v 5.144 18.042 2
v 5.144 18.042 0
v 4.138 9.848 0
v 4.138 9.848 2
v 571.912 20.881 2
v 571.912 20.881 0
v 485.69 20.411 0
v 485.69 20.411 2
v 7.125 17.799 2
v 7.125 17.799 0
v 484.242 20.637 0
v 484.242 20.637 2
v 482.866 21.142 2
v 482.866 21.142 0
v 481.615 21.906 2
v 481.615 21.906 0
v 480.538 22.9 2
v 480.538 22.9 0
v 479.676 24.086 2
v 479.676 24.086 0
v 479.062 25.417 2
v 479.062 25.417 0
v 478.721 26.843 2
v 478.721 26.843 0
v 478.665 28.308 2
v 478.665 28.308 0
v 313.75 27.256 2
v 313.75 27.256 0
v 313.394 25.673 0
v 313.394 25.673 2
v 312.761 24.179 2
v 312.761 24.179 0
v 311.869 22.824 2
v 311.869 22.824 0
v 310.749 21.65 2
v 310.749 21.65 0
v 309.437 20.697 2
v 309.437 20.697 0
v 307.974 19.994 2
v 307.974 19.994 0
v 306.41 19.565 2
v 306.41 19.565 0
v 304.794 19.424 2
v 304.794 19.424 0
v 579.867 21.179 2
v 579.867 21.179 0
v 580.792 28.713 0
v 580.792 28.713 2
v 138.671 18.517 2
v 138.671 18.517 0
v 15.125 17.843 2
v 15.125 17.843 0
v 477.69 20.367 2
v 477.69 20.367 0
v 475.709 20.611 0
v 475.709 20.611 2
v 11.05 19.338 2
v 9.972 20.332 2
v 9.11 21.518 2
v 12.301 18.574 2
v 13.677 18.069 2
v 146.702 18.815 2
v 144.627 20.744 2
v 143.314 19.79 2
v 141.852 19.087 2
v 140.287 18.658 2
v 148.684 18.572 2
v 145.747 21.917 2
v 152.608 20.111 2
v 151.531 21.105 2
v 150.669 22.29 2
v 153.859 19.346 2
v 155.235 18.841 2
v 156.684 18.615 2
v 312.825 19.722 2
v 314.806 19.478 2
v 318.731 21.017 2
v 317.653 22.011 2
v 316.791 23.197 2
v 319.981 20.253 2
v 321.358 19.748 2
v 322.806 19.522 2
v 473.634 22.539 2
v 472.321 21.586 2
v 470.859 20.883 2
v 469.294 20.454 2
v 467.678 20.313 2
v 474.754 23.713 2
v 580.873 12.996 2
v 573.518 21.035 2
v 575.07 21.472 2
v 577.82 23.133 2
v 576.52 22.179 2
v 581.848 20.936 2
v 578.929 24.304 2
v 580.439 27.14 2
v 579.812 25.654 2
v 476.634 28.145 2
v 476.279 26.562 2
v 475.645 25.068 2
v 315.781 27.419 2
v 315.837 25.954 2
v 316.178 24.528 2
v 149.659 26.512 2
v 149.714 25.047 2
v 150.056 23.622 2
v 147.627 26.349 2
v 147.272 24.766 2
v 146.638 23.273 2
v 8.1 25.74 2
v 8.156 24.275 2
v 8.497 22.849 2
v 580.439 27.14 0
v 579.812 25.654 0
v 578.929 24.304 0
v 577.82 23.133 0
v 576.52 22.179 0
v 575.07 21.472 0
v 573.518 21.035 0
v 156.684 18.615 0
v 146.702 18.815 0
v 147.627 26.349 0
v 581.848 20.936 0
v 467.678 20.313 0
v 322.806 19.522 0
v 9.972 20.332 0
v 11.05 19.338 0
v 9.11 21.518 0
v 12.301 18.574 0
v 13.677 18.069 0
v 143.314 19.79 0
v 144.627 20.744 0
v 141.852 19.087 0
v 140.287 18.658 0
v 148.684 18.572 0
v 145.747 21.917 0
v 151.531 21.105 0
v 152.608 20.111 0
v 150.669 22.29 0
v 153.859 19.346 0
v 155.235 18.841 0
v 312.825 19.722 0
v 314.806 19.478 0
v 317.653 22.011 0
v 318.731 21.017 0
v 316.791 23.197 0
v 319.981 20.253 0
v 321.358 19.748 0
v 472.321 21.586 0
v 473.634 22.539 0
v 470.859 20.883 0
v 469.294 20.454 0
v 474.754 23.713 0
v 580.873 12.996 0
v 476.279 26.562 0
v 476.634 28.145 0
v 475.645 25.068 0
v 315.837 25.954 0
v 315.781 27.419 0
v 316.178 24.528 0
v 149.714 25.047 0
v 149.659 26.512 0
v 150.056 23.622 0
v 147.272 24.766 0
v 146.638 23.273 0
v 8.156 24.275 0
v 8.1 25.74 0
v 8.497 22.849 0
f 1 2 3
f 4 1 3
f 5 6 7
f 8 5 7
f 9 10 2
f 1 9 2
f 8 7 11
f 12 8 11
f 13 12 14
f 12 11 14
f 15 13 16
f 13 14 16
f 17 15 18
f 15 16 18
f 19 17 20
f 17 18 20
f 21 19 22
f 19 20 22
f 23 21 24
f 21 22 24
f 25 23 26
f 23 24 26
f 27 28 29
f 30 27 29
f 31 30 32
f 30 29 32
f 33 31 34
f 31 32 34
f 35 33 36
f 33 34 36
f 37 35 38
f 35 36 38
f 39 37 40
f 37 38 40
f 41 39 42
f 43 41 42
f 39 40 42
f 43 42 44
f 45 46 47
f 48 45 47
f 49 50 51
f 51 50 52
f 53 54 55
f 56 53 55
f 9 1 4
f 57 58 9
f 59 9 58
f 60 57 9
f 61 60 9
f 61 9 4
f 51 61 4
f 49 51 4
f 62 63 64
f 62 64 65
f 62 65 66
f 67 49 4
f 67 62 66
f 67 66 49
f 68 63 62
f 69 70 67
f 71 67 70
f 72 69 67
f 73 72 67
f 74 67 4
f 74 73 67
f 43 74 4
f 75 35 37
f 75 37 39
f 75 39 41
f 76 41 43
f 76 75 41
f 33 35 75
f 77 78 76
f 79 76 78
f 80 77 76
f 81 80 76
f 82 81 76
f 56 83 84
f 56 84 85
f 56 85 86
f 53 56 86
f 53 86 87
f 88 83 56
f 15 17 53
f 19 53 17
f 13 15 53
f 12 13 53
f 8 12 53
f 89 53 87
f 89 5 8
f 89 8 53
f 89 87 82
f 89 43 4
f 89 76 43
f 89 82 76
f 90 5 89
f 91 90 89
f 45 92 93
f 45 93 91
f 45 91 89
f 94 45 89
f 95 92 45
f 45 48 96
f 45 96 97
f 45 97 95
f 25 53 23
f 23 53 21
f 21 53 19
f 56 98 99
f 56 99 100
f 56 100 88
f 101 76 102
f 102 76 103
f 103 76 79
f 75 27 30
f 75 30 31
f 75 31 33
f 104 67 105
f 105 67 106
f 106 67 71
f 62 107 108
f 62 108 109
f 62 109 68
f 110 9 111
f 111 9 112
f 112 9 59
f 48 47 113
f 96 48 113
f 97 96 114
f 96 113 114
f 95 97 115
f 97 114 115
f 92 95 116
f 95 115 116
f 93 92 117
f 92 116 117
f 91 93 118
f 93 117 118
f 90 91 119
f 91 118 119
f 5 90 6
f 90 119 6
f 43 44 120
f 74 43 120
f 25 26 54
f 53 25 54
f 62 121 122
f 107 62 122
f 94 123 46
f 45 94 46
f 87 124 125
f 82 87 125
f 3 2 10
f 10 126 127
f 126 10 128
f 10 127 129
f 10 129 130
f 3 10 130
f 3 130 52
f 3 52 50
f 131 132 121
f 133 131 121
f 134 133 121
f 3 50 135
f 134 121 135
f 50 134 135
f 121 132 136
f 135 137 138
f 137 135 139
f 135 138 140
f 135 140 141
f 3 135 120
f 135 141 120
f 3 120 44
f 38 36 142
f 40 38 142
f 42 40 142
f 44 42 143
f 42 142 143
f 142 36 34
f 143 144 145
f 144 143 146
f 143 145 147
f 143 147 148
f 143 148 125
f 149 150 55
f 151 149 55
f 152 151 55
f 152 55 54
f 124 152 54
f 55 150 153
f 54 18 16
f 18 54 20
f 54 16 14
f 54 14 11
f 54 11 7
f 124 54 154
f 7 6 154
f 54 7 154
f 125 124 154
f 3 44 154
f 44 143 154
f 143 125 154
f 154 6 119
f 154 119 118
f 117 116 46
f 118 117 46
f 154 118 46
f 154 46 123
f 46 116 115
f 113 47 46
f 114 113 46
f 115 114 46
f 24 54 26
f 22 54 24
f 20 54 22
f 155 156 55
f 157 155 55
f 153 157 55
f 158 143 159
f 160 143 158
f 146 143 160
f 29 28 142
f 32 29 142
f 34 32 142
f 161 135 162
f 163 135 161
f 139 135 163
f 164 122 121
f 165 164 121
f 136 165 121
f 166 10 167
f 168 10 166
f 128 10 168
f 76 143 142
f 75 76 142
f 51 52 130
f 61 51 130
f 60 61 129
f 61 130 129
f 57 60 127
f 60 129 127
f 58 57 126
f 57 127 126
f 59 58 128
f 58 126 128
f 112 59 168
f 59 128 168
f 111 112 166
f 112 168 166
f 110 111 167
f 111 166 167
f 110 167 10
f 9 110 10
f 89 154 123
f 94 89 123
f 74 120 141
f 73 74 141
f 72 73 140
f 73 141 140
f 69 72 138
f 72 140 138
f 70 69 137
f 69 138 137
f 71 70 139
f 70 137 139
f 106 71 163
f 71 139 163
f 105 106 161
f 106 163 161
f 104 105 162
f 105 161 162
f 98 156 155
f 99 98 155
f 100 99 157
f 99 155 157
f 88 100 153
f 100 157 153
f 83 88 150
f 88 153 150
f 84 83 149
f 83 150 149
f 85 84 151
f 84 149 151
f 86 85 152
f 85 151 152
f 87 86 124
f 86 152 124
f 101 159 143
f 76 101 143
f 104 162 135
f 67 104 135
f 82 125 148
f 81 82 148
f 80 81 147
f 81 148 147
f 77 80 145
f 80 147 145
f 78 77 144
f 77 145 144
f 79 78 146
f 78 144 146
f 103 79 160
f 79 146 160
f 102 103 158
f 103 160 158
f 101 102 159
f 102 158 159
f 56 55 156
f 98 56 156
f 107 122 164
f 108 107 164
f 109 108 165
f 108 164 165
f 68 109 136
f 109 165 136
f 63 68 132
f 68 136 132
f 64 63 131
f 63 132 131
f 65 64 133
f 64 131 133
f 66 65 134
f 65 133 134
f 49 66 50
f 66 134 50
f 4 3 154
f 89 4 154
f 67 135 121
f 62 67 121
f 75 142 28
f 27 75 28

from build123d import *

# Parameters (mm, degrees)
EXTRUDE_1_DEPTH = 2


with BuildPart() as part:
    # Model → 凸台-拉伸1 (new body)
    with BuildSketch(Plane.XY):
        with BuildLine():
            Line((5.143788589, 18.04241923), (4.137613793, 9.847783121))
            Line((4.137613793, 9.847783121), (580.873096163, 12.99559552))
            Line((580.873096163, 12.99559552), (581.848050911, 20.935964733))
            Line((581.848050911, 20.935964733), (579.866676478, 21.179246923))
            Line((579.866676478, 21.179246923), (580.791756024, 28.713415216))
            ThreePointArc((580.791756024, 28.713415216), (577.819958349, 23.132995179), (571.91207976, 20.881409119))
            Line((571.91207976, 20.881409119), (485.690224553, 20.411136961))
            ThreePointArc((485.690224553, 20.411136961), (480.53763707, 22.90043185), (478.665298456, 28.307842962))
            Line((478.665298456, 28.307842962), (477.690343709, 20.367473749))
            Line((477.690343709, 20.367473749), (475.708969276, 20.610755938))
            Line((475.708969276, 20.610755938), (476.634048822, 28.144924232))
            ThreePointArc((476.634048822, 28.144924232), (473.633509712, 22.539262149), (467.677868383, 20.31282583))
            Line((467.677868383, 20.31282583), (322.805939428, 19.522117319))
            ThreePointArc((322.805939428, 19.522117319), (317.653351945, 22.011412208), (315.781013331, 27.418823319))
            Line((315.781013331, 27.418823319), (314.806058584, 19.478454106))
            Line((314.806058584, 19.478454106), (312.824684151, 19.721736296))
            Line((312.824684151, 19.721736296), (313.749763697, 27.25590459))
            ThreePointArc((313.749763697, 27.25590459), (310.749224588, 21.650242507), (304.793583258, 19.423806187))
            Line((304.793583258, 19.423806187), (156.683570496, 18.615424271))
            ThreePointArc((156.683570496, 18.615424271), (151.530983012, 21.104719159), (149.658644399, 26.512130271))
            Line((149.658644399, 26.512130271), (148.683689651, 18.571761058))
            Line((148.683689651, 18.571761058), (146.702315218, 18.815043248))
            Line((146.702315218, 18.815043248), (147.627394764, 26.349211541))
            ThreePointArc((147.627394764, 26.349211541), (144.626855655, 20.743549458), (138.671214325, 18.517113139))
            Line((138.671214325, 18.517113139), (15.125043867, 17.842800254))
            ThreePointArc((15.125043867, 17.842800254), (9.972456383, 20.332095142), (8.10011777, 25.739506254))
            Line((8.10011777, 25.739506254), (7.125163022, 17.799137041))
            Line((7.125163022, 17.799137041), (5.143788589, 18.04241923))
        make_face()
    extrude(amount=EXTRUDE_1_DEPTH)


solid = part.part
